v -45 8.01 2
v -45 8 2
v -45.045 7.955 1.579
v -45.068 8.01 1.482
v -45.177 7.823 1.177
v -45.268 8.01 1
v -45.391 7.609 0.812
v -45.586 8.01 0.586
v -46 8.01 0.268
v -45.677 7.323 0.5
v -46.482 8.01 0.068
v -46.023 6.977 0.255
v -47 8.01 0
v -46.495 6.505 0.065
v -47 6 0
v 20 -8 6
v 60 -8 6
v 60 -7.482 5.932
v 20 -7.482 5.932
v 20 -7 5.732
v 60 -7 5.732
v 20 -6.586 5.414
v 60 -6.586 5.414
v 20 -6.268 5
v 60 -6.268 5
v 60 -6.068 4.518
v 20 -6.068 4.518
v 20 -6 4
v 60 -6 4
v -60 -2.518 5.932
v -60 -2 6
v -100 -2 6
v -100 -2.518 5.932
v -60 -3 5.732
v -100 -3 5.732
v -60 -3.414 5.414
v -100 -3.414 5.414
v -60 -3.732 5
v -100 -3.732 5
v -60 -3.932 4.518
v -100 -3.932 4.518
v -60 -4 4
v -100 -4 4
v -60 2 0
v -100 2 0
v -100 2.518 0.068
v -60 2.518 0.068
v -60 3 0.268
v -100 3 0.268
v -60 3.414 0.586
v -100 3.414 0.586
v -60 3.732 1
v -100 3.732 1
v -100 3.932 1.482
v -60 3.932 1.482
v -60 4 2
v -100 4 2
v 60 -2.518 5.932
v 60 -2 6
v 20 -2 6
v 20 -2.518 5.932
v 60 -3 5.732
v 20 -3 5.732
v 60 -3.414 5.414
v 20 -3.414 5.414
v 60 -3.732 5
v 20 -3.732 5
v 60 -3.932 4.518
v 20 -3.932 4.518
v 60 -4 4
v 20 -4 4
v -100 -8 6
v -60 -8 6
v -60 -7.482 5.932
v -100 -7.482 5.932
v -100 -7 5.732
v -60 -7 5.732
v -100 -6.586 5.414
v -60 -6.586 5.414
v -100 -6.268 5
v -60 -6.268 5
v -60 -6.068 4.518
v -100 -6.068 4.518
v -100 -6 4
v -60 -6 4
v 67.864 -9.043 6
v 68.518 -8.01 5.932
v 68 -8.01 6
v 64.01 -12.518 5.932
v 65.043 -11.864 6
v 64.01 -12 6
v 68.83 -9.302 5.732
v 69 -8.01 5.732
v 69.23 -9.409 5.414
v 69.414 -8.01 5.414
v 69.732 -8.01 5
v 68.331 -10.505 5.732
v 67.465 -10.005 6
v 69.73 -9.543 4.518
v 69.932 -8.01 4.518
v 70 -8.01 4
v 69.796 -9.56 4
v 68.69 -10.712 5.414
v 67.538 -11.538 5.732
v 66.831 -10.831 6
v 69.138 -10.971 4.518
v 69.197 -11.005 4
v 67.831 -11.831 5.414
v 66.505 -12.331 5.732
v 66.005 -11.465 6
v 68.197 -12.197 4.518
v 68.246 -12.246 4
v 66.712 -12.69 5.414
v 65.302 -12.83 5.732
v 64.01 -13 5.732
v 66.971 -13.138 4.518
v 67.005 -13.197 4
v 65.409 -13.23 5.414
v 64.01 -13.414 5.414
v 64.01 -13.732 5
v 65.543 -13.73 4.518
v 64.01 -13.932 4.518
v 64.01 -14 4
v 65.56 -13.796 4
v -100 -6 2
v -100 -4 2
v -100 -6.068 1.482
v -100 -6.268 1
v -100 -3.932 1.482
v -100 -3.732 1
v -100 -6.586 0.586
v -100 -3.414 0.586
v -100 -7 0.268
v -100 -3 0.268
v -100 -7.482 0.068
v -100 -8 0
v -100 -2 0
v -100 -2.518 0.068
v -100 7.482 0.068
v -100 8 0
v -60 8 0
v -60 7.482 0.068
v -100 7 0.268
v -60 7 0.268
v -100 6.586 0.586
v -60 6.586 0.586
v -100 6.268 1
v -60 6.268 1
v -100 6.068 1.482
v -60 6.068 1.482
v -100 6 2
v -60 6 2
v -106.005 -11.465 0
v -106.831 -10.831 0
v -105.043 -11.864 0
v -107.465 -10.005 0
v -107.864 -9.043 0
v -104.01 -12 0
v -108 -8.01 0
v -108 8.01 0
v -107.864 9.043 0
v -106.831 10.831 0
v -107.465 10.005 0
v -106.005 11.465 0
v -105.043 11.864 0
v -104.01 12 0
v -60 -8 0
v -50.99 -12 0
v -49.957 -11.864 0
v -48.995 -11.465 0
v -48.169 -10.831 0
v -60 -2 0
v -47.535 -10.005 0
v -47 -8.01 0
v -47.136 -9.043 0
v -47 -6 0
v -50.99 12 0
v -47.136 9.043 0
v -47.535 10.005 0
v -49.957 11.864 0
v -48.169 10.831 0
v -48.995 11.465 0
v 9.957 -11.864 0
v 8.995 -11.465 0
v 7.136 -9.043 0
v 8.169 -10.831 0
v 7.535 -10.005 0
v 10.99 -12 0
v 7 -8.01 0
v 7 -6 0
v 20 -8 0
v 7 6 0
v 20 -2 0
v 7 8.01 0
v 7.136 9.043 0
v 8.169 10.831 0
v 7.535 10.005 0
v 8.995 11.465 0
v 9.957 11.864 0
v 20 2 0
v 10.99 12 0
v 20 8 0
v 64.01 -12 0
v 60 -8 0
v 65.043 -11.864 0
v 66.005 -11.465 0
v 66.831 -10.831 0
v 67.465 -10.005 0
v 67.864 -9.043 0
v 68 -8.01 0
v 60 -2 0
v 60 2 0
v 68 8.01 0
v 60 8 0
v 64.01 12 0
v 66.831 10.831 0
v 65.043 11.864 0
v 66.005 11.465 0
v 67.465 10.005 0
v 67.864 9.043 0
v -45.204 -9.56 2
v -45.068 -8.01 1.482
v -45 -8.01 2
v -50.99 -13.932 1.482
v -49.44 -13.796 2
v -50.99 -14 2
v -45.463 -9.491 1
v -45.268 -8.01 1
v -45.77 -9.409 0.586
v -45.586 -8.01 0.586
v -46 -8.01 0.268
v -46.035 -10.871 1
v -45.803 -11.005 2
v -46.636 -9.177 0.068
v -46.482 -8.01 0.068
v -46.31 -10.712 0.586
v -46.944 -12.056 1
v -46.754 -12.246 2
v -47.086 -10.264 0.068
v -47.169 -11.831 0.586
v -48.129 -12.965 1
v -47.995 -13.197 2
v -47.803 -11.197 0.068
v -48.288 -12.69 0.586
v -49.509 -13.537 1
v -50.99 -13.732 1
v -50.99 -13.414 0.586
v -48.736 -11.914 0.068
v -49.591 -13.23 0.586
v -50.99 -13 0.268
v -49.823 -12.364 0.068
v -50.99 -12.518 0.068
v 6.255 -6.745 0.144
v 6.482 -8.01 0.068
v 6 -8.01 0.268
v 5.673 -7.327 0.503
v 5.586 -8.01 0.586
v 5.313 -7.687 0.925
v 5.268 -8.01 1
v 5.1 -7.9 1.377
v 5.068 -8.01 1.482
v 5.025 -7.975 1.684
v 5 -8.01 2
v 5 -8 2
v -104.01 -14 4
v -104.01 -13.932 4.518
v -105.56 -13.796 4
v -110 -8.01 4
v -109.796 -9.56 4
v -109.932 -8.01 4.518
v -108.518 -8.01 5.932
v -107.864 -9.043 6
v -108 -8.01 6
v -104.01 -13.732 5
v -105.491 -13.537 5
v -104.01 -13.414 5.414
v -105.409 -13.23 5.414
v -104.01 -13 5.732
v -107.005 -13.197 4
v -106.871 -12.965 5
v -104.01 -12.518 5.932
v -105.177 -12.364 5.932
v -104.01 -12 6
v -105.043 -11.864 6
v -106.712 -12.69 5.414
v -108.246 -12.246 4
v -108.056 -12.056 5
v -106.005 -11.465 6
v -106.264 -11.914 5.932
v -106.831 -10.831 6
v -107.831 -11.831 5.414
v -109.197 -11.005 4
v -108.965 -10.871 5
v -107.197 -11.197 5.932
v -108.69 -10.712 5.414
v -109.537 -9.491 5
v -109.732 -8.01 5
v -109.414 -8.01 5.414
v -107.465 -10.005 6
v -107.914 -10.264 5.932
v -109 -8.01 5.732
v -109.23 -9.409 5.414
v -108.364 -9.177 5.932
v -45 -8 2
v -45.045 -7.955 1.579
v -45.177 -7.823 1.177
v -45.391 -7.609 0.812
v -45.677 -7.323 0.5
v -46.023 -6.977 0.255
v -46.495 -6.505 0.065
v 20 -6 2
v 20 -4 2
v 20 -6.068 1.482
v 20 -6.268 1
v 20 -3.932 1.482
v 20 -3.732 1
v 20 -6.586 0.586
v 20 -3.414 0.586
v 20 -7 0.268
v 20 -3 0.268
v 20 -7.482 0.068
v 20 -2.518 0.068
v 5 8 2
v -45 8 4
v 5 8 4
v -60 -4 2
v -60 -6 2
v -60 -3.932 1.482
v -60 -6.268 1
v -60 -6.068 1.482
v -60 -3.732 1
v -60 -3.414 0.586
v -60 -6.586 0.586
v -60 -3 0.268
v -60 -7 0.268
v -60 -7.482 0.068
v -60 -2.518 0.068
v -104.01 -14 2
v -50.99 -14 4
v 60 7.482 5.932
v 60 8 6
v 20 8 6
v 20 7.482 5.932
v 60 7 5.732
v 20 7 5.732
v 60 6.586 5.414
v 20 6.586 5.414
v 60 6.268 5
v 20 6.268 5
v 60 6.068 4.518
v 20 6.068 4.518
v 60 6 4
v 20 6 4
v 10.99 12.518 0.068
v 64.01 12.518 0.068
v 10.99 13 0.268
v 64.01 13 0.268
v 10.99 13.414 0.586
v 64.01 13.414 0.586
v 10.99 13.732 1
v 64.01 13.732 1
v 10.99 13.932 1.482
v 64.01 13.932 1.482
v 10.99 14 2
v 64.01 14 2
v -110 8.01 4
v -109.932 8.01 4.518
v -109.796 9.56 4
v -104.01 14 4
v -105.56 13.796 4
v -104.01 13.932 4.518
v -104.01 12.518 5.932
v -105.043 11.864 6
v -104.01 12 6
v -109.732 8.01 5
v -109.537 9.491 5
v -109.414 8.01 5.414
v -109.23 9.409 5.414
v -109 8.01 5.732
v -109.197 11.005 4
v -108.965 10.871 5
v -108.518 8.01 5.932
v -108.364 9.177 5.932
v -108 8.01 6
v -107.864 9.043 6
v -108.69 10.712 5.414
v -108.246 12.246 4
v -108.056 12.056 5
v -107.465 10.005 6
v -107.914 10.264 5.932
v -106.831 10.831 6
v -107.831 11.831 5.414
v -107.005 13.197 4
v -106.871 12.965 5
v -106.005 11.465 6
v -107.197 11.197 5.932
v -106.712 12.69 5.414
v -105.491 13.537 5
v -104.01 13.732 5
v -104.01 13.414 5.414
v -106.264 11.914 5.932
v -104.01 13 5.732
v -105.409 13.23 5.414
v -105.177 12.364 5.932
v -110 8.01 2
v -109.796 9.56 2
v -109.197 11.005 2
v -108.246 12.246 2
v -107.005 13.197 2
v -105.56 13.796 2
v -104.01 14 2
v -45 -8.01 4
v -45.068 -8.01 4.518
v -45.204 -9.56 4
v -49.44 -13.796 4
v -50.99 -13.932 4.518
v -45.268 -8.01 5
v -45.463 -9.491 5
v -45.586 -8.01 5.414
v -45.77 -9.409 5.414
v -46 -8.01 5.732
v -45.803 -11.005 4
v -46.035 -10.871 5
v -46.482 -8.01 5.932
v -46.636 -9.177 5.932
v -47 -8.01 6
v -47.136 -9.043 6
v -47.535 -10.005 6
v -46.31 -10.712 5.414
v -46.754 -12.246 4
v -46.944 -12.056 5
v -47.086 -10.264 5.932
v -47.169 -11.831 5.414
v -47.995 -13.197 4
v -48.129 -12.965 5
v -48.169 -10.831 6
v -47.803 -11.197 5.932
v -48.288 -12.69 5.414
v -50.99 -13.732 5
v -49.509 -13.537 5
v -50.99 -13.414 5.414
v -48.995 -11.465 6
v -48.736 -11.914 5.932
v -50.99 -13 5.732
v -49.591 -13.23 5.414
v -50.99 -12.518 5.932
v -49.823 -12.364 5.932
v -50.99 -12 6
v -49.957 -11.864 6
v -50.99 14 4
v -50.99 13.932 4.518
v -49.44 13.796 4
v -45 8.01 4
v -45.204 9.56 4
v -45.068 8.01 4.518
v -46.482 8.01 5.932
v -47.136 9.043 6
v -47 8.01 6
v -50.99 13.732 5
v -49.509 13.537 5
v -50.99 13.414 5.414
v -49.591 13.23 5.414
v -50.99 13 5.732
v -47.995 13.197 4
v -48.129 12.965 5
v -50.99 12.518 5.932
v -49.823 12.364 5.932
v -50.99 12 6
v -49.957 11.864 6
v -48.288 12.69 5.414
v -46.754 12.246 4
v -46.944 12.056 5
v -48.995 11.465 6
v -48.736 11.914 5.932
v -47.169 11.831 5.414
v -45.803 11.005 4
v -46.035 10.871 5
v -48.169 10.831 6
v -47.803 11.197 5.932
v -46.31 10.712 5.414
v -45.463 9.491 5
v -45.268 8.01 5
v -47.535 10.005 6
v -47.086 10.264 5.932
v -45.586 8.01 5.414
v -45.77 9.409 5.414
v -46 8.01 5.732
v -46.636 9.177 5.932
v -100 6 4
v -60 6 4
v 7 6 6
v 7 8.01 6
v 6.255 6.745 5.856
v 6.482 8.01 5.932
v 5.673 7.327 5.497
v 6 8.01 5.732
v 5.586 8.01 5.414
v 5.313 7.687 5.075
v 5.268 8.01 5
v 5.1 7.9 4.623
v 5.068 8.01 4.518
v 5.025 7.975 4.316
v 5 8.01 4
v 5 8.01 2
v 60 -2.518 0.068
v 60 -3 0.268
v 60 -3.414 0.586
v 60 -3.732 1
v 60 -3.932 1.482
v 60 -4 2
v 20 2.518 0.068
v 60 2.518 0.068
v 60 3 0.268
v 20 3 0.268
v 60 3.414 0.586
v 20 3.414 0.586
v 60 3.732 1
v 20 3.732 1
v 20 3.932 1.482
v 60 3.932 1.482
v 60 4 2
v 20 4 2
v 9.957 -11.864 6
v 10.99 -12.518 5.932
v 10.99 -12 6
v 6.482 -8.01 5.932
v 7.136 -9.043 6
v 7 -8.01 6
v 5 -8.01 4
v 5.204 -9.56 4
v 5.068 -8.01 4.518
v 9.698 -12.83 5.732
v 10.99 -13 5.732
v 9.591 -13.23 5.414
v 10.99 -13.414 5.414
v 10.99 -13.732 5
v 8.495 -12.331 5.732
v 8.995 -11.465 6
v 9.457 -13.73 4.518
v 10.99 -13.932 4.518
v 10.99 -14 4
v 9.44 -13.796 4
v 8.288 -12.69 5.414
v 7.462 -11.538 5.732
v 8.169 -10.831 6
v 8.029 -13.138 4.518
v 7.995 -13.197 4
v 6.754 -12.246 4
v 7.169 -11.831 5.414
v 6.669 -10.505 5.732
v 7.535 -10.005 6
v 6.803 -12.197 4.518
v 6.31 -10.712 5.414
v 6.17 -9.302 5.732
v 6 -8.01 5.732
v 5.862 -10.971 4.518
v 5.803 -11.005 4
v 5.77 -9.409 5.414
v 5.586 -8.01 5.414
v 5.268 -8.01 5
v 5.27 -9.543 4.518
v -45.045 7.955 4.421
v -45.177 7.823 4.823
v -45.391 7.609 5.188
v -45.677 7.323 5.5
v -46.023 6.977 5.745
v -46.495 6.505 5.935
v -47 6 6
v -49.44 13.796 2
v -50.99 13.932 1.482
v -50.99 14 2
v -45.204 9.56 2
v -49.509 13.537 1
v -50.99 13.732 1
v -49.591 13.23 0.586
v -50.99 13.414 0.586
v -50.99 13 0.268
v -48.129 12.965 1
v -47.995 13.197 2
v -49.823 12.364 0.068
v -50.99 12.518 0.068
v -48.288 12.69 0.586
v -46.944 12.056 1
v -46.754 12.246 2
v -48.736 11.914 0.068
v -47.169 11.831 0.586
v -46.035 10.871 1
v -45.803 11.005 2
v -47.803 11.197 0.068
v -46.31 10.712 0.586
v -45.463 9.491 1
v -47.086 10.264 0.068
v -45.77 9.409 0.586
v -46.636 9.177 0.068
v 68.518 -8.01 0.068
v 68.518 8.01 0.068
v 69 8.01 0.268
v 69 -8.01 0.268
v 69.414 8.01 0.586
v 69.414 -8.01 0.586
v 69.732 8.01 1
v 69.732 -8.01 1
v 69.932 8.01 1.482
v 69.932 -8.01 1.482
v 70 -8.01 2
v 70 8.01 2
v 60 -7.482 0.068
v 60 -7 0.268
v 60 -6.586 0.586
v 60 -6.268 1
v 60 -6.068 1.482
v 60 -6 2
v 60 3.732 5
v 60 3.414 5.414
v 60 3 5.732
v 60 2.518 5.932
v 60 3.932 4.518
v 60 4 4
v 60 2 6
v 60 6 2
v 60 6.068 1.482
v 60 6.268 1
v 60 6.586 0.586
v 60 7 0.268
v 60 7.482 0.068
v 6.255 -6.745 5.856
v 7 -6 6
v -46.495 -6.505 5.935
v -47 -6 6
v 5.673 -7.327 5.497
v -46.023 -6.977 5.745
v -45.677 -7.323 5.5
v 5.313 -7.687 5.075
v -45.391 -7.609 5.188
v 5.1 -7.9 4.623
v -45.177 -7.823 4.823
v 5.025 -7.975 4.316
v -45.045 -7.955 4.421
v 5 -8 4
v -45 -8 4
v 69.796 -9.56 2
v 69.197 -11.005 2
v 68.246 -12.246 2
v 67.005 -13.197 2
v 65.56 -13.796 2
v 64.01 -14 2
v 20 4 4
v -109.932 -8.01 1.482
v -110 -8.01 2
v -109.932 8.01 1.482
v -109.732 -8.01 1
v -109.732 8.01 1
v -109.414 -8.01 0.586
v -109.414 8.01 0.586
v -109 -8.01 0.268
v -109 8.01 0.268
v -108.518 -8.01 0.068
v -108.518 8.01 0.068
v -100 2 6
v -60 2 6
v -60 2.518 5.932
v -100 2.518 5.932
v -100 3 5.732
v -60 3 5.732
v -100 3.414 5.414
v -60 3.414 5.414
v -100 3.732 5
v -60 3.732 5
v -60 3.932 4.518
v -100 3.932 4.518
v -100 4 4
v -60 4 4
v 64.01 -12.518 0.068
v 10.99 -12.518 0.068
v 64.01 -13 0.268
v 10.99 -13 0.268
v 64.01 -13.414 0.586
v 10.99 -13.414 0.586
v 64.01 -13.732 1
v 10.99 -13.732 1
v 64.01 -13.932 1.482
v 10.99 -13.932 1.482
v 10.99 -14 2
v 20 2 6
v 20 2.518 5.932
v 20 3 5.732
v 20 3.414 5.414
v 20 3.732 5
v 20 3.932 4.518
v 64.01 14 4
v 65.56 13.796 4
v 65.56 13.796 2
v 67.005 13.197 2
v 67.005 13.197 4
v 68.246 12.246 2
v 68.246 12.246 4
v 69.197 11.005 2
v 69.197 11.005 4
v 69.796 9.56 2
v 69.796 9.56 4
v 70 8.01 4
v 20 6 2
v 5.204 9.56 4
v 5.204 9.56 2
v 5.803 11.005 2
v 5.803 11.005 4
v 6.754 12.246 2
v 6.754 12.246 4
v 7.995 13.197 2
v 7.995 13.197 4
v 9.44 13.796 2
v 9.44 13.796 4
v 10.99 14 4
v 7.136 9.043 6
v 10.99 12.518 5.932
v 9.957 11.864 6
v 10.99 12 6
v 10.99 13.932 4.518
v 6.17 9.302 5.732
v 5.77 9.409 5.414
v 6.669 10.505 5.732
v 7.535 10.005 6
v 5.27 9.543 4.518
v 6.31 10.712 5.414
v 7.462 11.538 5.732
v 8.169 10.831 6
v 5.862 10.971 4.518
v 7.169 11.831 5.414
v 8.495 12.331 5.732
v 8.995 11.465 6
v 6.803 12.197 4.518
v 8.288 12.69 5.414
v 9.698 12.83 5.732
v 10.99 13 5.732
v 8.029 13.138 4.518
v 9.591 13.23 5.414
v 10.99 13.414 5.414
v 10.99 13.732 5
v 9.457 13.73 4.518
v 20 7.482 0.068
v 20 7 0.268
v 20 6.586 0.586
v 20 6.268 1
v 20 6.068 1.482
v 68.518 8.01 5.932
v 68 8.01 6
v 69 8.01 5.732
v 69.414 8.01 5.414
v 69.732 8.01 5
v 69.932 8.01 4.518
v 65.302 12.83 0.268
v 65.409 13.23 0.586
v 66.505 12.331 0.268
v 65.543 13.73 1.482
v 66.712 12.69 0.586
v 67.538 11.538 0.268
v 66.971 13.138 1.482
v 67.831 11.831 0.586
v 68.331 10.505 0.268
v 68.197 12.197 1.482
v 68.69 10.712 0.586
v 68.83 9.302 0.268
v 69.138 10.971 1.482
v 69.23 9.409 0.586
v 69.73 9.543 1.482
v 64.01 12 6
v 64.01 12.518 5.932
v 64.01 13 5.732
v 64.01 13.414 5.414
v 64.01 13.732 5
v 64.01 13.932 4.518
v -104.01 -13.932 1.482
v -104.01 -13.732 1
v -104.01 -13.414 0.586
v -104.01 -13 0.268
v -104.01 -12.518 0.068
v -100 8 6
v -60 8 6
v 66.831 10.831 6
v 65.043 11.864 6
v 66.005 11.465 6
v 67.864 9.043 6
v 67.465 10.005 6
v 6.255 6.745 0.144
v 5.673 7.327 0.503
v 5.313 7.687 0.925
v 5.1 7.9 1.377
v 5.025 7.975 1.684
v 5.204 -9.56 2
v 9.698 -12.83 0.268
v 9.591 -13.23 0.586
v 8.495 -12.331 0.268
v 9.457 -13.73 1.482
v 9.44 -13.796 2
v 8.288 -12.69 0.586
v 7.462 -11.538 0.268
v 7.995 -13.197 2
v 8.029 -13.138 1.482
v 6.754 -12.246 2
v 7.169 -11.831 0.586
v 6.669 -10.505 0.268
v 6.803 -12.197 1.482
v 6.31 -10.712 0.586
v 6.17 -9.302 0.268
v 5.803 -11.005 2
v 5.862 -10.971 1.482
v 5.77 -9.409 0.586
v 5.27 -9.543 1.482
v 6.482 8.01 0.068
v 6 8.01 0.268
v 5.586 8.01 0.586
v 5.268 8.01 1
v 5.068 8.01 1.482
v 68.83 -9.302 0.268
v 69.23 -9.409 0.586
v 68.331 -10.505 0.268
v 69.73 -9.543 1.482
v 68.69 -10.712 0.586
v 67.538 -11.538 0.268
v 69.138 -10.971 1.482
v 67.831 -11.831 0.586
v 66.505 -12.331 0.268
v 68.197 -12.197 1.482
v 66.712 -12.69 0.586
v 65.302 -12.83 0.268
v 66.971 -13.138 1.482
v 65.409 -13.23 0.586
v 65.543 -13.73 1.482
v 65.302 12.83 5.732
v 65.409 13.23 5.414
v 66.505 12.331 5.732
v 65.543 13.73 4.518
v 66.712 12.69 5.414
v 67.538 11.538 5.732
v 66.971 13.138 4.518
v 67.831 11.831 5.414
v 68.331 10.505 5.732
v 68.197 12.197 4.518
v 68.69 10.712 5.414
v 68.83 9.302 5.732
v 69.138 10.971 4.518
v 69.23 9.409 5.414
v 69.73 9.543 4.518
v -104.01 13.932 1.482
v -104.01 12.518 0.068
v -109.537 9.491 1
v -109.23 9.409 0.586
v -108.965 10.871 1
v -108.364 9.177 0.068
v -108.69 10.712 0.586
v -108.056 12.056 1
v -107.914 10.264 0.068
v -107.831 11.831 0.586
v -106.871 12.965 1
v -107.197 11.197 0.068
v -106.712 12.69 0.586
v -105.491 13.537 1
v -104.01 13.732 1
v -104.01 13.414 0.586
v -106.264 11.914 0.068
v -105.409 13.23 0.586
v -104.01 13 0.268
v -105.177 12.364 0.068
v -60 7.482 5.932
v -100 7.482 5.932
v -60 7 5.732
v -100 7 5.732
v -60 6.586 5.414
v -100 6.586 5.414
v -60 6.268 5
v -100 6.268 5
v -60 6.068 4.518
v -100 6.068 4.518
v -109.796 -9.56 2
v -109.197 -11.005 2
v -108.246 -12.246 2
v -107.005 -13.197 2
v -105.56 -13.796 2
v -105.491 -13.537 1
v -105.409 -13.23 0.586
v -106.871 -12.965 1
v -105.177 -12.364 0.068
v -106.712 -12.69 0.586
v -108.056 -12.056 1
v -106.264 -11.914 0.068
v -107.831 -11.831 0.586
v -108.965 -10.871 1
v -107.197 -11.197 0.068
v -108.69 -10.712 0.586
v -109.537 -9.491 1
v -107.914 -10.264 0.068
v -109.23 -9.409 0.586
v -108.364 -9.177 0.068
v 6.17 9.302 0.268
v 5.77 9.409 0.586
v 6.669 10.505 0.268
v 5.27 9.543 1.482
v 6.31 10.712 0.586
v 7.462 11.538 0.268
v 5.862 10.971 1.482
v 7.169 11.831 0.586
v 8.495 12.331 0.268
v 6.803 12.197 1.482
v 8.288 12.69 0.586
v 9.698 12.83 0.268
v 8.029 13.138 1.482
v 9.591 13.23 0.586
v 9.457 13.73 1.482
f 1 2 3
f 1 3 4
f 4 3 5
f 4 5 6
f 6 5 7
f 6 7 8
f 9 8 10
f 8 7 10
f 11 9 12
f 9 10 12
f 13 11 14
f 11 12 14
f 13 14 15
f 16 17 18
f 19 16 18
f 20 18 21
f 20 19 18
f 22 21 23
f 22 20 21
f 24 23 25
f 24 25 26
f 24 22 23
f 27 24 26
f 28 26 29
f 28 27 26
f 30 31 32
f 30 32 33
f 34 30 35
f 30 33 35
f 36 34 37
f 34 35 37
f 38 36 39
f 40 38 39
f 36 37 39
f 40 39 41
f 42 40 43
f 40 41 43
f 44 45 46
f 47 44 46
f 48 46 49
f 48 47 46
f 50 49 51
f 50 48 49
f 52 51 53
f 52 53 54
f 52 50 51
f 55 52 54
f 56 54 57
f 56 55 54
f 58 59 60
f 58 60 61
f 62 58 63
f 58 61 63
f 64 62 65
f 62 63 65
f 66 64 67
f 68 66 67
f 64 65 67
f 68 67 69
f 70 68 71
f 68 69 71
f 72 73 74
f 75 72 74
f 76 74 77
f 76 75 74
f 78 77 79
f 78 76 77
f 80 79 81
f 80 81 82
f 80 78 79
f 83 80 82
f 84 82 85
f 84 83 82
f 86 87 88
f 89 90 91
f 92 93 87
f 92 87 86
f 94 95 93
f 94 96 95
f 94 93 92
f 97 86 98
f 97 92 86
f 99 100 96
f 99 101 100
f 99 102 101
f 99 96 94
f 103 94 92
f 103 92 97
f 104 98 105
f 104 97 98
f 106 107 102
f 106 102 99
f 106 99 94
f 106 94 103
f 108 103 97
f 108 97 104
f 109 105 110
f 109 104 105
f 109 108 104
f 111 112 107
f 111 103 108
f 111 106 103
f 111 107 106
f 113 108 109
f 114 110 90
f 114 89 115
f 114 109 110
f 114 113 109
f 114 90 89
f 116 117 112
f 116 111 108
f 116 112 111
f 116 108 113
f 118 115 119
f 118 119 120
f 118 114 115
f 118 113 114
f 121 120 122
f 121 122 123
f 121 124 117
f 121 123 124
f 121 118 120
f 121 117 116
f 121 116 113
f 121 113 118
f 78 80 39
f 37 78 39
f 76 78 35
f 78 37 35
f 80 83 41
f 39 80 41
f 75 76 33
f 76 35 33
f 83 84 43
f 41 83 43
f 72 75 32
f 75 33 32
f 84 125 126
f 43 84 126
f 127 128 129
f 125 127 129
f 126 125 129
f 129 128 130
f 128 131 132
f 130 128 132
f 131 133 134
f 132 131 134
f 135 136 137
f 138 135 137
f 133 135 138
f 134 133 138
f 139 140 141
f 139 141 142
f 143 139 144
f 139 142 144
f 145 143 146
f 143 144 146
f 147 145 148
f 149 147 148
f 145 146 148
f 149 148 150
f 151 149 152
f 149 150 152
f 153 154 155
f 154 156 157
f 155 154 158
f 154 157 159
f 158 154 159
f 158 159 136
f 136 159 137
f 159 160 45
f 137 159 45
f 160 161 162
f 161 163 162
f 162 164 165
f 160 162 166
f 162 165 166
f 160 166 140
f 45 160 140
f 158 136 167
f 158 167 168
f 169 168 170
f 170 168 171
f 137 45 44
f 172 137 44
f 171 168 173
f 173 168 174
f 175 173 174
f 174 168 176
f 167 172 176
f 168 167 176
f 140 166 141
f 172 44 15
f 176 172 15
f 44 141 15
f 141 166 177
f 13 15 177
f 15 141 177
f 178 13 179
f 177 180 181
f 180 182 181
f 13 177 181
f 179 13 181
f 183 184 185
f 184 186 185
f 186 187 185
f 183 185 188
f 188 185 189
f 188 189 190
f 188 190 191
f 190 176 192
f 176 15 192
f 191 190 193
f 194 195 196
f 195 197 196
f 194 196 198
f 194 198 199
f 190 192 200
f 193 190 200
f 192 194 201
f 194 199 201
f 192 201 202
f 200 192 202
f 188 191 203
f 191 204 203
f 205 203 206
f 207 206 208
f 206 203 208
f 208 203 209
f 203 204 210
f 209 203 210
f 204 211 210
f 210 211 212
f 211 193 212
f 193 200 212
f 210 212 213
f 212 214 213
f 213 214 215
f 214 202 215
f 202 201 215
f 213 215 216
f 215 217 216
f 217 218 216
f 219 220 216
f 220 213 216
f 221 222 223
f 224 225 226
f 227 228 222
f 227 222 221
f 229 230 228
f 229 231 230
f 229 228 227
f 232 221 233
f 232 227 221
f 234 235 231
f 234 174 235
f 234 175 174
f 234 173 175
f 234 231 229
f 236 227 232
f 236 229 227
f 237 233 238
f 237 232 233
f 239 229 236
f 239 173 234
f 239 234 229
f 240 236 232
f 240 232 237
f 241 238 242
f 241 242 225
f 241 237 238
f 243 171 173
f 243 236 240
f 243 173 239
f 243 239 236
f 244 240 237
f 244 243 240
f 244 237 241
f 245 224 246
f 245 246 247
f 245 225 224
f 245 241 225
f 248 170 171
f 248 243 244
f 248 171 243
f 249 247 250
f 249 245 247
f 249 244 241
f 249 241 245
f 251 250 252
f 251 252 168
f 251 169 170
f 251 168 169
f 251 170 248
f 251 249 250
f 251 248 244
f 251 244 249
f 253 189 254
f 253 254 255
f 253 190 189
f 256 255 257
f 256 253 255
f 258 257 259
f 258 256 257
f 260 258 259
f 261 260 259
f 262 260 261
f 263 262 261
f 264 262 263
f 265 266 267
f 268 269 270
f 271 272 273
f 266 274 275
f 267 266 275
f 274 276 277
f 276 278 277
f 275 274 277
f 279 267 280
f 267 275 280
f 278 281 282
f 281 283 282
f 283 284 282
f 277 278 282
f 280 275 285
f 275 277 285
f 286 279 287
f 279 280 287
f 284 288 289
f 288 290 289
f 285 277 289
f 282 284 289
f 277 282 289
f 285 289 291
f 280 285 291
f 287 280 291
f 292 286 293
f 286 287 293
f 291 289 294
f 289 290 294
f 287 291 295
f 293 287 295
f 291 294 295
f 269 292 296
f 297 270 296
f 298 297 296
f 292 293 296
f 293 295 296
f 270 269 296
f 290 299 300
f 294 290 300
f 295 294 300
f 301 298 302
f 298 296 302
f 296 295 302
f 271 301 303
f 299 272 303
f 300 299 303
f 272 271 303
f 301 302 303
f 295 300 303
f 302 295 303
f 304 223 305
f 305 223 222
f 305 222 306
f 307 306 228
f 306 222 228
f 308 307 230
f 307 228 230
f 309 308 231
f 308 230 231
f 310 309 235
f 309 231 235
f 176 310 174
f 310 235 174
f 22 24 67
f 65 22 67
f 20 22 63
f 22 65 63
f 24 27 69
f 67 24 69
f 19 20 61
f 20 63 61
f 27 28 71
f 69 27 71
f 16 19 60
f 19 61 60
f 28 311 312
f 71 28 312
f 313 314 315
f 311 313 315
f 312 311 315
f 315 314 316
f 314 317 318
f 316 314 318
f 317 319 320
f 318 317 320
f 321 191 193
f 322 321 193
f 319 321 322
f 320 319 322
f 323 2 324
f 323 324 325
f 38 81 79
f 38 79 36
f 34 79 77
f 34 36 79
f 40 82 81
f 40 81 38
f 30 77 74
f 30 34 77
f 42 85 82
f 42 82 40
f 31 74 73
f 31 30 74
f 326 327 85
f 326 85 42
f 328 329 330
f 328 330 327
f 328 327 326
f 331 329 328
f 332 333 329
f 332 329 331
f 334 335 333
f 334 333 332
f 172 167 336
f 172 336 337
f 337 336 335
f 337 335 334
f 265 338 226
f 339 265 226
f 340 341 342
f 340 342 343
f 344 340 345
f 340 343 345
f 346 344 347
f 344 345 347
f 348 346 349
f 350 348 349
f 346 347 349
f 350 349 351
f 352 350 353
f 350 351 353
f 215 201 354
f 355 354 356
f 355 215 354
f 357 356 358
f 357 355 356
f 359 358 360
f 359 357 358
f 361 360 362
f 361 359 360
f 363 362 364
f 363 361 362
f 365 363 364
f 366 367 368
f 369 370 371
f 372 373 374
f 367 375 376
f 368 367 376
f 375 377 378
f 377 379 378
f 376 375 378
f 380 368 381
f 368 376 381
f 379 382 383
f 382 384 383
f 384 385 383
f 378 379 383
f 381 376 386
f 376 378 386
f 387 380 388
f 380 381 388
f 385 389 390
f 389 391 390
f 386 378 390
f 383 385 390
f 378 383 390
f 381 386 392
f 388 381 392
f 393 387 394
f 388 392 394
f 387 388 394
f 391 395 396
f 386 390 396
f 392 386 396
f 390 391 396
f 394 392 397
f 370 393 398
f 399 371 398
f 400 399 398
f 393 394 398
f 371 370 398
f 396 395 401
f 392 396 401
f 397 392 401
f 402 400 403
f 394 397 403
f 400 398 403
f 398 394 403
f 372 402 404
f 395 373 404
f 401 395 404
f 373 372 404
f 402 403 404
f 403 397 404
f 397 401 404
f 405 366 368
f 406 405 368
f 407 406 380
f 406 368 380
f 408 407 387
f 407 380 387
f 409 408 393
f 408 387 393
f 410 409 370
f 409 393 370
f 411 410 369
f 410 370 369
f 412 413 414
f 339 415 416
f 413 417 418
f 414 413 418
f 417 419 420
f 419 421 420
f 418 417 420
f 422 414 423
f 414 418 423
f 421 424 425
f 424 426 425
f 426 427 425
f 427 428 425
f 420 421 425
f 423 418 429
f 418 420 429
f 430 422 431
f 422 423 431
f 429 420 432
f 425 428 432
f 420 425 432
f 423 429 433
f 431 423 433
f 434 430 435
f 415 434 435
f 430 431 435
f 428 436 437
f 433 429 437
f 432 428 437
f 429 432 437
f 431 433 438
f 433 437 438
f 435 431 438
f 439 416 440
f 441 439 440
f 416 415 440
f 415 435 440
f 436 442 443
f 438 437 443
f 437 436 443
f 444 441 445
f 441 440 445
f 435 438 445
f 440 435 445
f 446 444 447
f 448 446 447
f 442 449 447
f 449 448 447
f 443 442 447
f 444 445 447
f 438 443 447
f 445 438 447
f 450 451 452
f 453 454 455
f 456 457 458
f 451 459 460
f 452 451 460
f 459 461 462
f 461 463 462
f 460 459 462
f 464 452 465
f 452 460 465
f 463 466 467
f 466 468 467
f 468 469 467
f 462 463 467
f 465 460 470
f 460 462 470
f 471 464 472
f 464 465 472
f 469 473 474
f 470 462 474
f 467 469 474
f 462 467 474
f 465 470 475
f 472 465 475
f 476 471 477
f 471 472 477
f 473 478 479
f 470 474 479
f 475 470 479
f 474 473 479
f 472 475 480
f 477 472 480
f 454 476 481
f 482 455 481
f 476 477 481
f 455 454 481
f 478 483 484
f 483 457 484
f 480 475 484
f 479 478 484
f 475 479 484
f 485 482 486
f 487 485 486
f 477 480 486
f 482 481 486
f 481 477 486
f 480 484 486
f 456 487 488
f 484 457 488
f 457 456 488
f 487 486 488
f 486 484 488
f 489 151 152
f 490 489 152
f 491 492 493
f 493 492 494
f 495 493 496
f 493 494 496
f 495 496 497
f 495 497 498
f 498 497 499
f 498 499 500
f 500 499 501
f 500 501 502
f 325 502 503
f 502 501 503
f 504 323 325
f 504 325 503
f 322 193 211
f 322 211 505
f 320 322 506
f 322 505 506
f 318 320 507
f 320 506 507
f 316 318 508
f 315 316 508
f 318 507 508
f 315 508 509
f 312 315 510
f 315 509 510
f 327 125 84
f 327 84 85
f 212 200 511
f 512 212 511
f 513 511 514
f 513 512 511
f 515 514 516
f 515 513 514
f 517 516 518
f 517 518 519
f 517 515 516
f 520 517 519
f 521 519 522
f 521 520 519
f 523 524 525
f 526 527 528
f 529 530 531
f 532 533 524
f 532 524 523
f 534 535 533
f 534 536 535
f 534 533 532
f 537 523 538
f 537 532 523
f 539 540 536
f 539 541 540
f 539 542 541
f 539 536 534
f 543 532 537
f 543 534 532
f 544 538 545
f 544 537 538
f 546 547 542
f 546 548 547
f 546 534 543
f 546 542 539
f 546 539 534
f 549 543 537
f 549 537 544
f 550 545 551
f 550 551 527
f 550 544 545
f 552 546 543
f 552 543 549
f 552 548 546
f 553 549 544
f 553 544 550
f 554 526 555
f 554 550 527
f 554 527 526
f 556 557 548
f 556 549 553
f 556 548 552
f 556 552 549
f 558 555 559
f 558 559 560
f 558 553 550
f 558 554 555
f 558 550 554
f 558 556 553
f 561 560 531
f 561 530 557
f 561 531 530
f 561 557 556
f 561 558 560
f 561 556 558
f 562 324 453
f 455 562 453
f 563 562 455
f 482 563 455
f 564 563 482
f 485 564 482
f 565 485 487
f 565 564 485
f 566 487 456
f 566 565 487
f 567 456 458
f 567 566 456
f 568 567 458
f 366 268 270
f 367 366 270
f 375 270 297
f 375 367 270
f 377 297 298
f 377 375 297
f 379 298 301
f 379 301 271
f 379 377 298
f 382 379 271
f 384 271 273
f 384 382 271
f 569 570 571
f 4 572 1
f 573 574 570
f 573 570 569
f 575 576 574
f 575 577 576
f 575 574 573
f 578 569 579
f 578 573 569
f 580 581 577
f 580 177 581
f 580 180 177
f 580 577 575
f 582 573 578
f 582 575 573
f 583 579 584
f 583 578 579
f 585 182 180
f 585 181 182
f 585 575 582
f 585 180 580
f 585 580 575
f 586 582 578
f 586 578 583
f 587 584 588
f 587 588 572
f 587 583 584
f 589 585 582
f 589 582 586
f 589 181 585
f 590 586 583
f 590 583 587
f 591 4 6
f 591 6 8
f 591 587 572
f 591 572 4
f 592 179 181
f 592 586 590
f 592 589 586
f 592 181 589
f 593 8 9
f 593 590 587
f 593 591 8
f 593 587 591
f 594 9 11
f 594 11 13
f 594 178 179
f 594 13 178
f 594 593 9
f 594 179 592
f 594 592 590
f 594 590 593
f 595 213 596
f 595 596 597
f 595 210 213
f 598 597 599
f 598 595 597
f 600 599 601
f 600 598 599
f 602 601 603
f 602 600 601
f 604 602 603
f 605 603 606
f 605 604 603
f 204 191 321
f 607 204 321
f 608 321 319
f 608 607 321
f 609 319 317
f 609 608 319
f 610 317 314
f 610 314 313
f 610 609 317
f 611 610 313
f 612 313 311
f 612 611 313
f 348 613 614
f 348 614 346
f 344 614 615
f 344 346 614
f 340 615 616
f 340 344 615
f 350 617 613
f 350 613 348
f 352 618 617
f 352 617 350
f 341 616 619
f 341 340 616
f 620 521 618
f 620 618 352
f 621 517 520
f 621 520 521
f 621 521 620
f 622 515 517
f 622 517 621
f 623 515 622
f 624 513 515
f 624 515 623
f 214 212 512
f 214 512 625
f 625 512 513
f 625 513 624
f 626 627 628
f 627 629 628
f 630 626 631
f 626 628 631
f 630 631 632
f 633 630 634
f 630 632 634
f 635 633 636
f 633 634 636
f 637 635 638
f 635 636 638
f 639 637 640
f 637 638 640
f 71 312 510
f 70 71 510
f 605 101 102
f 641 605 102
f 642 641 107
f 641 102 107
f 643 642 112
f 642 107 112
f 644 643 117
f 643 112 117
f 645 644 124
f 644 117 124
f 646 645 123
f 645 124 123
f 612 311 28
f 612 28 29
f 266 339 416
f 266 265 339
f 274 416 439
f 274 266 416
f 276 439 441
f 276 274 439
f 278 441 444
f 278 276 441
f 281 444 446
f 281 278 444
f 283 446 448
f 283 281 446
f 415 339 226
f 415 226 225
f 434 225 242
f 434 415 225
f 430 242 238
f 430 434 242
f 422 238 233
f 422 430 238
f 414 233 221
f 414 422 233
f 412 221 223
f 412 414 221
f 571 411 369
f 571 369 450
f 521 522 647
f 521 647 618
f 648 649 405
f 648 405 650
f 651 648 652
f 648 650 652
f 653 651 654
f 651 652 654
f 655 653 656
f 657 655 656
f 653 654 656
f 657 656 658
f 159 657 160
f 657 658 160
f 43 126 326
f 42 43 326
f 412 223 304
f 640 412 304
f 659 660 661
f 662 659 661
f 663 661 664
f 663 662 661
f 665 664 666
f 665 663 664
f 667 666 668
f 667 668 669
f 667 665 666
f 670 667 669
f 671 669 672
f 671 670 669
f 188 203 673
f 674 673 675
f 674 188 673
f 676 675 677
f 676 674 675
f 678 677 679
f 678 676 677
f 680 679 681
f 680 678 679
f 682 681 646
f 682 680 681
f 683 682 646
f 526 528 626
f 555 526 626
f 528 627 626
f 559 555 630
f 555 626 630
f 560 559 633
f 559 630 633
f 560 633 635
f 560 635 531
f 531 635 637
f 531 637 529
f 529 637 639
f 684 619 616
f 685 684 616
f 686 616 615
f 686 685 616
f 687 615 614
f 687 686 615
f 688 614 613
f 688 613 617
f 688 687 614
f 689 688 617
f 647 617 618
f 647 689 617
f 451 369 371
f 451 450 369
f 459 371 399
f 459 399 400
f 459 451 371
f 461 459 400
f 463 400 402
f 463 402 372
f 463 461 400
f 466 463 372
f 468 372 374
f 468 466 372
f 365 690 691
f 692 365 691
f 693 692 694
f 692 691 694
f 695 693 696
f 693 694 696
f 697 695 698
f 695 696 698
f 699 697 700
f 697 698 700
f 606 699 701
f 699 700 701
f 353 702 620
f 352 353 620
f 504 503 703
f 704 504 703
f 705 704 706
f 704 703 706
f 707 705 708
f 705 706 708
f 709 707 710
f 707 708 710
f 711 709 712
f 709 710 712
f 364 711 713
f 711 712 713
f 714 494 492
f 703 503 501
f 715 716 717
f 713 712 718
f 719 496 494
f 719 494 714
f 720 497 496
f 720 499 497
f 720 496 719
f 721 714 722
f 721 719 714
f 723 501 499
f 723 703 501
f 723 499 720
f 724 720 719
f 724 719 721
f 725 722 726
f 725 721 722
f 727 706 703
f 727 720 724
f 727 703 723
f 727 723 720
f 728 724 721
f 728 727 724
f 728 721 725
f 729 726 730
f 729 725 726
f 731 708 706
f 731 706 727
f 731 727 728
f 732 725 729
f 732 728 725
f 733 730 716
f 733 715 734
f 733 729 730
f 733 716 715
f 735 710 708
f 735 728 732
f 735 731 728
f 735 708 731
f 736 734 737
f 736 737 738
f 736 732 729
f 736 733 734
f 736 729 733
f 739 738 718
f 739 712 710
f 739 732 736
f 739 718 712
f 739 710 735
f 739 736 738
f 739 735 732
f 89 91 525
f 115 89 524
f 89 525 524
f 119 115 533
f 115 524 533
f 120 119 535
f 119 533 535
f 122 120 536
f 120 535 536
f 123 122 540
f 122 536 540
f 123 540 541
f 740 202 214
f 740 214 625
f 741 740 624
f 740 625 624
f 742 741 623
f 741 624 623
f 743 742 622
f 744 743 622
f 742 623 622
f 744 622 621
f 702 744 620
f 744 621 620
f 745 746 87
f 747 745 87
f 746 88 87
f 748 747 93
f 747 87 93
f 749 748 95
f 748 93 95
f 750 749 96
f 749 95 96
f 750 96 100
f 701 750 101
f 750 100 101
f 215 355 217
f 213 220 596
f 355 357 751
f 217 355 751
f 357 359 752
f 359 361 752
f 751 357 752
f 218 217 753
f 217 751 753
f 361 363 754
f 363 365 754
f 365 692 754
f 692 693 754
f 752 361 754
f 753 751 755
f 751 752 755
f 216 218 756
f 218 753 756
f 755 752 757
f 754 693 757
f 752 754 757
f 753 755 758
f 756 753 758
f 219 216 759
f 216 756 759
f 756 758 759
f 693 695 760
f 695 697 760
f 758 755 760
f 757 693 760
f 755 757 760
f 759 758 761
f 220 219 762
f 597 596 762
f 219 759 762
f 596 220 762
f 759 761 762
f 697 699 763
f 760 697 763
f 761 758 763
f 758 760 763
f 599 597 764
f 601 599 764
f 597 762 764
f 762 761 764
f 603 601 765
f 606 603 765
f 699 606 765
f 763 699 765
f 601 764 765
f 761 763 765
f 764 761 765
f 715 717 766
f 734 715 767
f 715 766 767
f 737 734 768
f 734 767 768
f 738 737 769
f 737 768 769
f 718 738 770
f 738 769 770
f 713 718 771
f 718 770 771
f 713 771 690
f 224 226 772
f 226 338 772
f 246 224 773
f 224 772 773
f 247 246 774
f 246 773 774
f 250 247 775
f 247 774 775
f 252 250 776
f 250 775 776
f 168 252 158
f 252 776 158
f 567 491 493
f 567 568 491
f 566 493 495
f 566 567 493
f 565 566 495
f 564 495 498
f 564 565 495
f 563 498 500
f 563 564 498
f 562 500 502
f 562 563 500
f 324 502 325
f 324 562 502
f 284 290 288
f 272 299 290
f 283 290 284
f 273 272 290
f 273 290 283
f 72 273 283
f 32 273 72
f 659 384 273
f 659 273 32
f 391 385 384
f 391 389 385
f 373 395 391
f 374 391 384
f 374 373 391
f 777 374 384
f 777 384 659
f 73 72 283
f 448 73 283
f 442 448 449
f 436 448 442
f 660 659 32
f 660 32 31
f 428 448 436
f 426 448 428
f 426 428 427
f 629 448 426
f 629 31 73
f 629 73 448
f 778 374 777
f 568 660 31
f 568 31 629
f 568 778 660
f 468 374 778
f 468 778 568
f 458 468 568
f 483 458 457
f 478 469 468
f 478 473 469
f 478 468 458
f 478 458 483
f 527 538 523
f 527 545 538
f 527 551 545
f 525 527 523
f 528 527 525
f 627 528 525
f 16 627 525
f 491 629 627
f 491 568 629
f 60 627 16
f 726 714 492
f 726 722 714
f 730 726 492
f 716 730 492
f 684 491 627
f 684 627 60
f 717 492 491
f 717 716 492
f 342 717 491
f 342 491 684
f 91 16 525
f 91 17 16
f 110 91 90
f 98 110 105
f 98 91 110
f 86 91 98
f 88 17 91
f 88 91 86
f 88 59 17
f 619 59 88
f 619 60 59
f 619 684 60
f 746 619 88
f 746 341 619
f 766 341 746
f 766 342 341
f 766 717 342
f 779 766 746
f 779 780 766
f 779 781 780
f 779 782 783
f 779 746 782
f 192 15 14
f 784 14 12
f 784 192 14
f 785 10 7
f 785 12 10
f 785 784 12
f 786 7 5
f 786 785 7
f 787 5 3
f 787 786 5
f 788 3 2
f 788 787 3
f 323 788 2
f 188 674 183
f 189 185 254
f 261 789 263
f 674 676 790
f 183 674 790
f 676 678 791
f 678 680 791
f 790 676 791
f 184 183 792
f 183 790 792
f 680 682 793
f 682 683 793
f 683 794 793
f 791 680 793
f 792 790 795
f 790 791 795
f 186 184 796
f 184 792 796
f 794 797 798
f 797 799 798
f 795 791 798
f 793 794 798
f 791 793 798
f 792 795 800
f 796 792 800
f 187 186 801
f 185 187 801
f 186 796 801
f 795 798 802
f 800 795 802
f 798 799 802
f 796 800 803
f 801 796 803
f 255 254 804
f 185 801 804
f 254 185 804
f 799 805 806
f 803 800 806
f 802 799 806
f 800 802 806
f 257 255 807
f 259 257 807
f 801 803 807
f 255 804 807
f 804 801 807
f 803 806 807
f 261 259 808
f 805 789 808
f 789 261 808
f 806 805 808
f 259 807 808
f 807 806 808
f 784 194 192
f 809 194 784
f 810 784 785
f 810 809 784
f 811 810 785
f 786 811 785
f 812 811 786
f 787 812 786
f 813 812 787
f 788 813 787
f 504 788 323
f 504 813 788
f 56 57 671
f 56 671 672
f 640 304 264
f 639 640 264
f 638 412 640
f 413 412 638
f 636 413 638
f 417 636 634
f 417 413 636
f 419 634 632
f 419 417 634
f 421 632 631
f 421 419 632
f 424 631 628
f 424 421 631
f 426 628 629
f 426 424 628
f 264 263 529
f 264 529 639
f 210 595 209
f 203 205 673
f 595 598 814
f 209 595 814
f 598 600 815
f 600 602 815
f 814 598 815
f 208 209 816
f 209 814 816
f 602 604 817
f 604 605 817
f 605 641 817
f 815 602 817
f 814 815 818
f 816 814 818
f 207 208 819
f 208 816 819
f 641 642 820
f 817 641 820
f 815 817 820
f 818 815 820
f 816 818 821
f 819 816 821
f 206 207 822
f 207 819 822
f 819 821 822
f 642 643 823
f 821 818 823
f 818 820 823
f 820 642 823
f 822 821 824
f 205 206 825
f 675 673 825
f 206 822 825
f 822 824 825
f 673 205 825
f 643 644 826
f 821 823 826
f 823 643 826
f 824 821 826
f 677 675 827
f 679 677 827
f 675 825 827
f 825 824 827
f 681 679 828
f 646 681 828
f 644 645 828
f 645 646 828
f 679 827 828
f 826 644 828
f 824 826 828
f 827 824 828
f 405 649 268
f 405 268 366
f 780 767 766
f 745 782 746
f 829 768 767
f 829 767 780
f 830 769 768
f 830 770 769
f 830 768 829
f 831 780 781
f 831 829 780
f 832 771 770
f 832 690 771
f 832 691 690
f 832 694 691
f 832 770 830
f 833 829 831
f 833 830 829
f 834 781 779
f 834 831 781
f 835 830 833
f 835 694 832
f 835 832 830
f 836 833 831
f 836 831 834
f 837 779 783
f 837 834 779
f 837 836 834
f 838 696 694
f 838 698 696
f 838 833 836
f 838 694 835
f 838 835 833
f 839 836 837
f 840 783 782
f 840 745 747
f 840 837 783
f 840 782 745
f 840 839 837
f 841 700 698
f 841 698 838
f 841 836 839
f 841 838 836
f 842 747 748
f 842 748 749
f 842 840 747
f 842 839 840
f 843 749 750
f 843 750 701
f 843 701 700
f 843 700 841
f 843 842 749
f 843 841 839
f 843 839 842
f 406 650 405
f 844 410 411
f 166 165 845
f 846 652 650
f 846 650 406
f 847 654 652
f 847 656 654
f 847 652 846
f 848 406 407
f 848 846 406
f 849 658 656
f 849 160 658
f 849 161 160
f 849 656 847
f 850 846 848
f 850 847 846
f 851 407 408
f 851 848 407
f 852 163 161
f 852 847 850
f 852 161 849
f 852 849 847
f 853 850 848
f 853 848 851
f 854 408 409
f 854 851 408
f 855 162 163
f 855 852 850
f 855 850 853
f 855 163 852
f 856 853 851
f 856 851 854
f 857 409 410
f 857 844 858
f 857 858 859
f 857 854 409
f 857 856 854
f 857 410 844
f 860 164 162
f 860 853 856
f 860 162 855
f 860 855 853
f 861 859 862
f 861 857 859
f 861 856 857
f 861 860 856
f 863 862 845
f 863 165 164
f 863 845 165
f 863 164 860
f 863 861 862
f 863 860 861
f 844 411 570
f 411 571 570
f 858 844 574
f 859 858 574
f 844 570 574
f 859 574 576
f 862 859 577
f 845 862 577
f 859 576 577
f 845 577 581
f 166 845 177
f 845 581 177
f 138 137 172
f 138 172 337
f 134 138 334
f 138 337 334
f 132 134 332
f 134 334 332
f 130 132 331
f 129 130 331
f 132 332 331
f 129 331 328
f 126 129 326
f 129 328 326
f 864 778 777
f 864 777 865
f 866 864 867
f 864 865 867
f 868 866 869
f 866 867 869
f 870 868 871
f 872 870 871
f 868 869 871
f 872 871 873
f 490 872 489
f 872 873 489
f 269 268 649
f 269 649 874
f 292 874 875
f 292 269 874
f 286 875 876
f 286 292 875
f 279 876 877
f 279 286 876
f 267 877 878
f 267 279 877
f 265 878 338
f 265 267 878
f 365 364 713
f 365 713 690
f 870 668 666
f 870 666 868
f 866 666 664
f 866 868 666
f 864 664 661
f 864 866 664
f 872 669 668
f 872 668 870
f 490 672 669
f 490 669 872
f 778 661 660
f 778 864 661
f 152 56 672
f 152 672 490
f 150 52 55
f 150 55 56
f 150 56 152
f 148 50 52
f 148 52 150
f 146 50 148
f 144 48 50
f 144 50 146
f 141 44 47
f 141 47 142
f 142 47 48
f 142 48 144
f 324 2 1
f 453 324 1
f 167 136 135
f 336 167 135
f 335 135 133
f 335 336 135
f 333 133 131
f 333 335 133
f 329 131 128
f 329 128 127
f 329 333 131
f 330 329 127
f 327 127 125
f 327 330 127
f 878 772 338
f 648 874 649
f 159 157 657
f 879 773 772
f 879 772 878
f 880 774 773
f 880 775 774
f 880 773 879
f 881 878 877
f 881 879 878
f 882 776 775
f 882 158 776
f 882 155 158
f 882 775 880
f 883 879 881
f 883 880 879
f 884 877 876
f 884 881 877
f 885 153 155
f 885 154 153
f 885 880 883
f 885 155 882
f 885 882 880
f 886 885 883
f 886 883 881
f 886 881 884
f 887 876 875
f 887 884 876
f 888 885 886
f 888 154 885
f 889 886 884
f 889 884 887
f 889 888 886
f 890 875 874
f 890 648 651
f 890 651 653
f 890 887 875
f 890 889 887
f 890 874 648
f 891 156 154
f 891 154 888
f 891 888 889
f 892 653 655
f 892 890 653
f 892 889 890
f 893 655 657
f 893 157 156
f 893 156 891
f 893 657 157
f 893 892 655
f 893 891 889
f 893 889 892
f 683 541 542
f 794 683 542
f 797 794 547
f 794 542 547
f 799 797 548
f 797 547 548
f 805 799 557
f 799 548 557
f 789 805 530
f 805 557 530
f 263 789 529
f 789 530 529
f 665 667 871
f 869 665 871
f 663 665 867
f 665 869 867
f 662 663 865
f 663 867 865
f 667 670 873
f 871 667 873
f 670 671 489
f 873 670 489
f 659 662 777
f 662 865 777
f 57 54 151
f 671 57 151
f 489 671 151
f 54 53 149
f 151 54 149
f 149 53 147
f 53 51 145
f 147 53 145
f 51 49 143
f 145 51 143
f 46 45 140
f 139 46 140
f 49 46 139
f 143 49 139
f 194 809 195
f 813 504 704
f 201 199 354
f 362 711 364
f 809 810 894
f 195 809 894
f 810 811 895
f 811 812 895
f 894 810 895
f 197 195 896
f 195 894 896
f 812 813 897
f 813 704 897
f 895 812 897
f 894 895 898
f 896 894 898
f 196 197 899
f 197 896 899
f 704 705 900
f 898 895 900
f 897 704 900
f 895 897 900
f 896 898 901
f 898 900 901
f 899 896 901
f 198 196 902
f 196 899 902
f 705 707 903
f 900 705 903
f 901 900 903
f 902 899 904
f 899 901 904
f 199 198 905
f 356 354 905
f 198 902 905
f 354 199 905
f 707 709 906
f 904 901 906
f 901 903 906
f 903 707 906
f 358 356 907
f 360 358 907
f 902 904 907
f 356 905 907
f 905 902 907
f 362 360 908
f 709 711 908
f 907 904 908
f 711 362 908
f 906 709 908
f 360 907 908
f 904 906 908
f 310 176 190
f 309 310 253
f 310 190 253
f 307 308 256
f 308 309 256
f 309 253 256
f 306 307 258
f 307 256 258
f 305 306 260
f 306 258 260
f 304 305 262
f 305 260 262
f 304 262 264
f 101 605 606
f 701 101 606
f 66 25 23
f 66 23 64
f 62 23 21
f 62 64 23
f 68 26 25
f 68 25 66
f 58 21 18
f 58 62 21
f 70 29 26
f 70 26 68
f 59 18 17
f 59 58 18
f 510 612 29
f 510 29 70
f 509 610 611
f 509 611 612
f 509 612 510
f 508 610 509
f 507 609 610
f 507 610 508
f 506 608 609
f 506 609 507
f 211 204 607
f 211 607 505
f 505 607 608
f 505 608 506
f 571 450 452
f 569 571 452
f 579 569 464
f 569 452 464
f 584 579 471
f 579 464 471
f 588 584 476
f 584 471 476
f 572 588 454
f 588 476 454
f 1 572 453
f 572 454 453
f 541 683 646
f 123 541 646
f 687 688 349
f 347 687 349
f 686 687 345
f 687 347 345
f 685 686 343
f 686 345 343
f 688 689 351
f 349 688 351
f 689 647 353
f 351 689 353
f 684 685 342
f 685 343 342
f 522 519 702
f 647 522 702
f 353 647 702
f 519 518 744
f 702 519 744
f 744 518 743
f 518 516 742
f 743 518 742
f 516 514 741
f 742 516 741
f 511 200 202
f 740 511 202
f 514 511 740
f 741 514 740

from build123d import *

# Parameters (mm, degrees)
BOX003_W     = 40
BOX003_H     = 2
BOX003_DEPTH = 10
BOX004_W     = 40
BOX004_H     = 2
BOX004_DEPTH = 10
BOX002_W     = 40
BOX002_H     = 2
BOX002_DEPTH = 10
BOX005_W     = 50
BOX005_H     = 6
BOX005_DEPTH = 10
BOX006_W     = 50
BOX006_H     = 6
BOX006_DEPTH = 10
BOX001_W     = 40
BOX001_H     = 2
BOX001_DEPTH = 10
BOX_W        = 180
BOX_H        = 28
BOX_DEPTH    = 6
FILLET_R     = 5.99
FILLET001_R  = 2


with BuildPart() as cube003:
    # Box003 → Box003 (new body)
    with BuildSketch(Plane(origin=(20, -6, 0), x_dir=(1, 0, 0), z_dir=(0, 0, 1))):
        with Locations((20, 1)):
            Rectangle(BOX003_W, BOX003_H)
    extrude(amount=BOX003_DEPTH)


with BuildPart() as cube004:
    # Box004 → Box004 (new body)
    with BuildSketch(Plane(origin=(20, 4, 0), x_dir=(1, 0, 0), z_dir=(0, 0, 1))):
        with Locations((20, 1)):
            Rectangle(BOX004_W, BOX004_H)
    extrude(amount=BOX004_DEPTH)


with BuildPart() as cube002:
    # Box002 → Box002 (new body)
    with BuildSketch(Plane(origin=(-100, 4, 0), x_dir=(1, 0, 0), z_dir=(0, 0, 1))):
        with Locations((20, 1)):
            Rectangle(BOX002_W, BOX002_H)
    extrude(amount=BOX002_DEPTH)


with BuildPart() as cube005:
    # Box005 → Box005 (new body)
    with BuildSketch(Plane(origin=(-45, -14, 0), x_dir=(1, 0, 0), z_dir=(0, 0, 1))):
        with Locations((25, 3)):
            Rectangle(BOX005_W, BOX005_H)
    extrude(amount=BOX005_DEPTH)


with BuildPart() as cube006:
    # Box006 → Box006 (new body)
    with BuildSketch(Plane(origin=(-45, 8, 0), x_dir=(1, 0, 0), z_dir=(0, 0, 1))):
        with Locations((25, 3)):
            Rectangle(BOX006_W, BOX006_H)
    extrude(amount=BOX006_DEPTH)


with BuildPart() as holes:
    # Box001 → Box001 (new body)
    with BuildSketch(Plane(origin=(-100, -6, 0), x_dir=(1, 0, 0), z_dir=(0, 0, 1))):
        with Locations((20, 1)):
            Rectangle(BOX001_W, BOX001_H)
    extrude(amount=BOX001_DEPTH)

    # Fusion: union Cube003, Cube004, Cube002, Cube005, Cube006
    add(cube003.part)
    add(cube004.part)
    add(cube002.part)
    add(cube005.part)
    add(cube006.part)


with BuildPart() as fillet001:
    # Box → Box (new body)
    with BuildSketch(Plane(origin=(-110, -14, 0), x_dir=(1, 0, 0), z_dir=(0, 0, 1))):
        with Locations((90, 14)):
            Rectangle(BOX_W, BOX_H)
    extrude(amount=BOX_DEPTH)

    # Cut: cut Holes
    add(holes.part, mode=Mode.SUBTRACT)

    # Fillet
    fillet_edges = [fillet001.edges().sort_by_distance(p)[0] for p in [
        (-110, -14, 3),
        (-110, 14, 3),
        (-45, -14, 3),
        (-45, 14, 3),
        (5, 14, 3),
        (70, 14, 3),
        (70, -14, 3),
        (5, -14, 3),
    ]]
    fillet(fillet_edges, radius=FILLET_R)

    # Fillet001
    fillet001_edges = [fillet001.edges().sort_by_distance(p)[0] for p in [
        (-110, 0, 6),
        (-110, 0, 0),
        (-77.5, 14, 6),
        (-108.24557, 12.24557, 6),
        (-46.75443, 12.24557, 6),
        (-108.24557, -12.24557, 6),
        (-20, 8, 6),
        (-77.5, -14, 6),
        (-46.75443, -12.24557, 6),
        (6.75443, 12.24557, 6),
        (37.5, 14, 6),
        (-20, -8, 6),
        (68.24557, 12.24557, 6),
        (70, 0, 6),
        (6.75443, -12.24557, 6),
        (68.24557, -12.24557, 6),
        (37.5, -14, 6),
        (-80, -6, 6),
        (-80, -4, 6),
        (-80, 4, 6),
        (-80, 6, 6),
        (40, 4, 6),
        (40, 6, 6),
        (40, -6, 6),
        (40, -4, 6),
        (-108.24557, -12.24557, 0),
        (-108.24557, 12.24557, 0),
        (-77.5, 14, 0),
        (-46.75443, 12.24557, 0),
        (-20, 8, 0),
        (-77.5, -14, 0),
        (-46.75443, -12.24557, 0),
        (6.75443, 12.24557, 0),
        (37.5, 14, 0),
        (-20, -8, 0),
        (68.24557, 12.24557, 0),
        (70, 0, 0),
        (6.75443, -12.24557, 0),
        (68.24557, -12.24557, 0),
        (37.5, -14, 0),
        (-80, -6, 0),
        (-80, -4, 0),
        (-80, 4, 0),
        (-80, 6, 0),
        (40, 4, 0),
        (40, 6, 0),
        (40, -6, 0),
        (40, -4, 0),
    ]]
    fillet(fillet001_edges, radius=FILLET001_R)


solid = fillet001.part
